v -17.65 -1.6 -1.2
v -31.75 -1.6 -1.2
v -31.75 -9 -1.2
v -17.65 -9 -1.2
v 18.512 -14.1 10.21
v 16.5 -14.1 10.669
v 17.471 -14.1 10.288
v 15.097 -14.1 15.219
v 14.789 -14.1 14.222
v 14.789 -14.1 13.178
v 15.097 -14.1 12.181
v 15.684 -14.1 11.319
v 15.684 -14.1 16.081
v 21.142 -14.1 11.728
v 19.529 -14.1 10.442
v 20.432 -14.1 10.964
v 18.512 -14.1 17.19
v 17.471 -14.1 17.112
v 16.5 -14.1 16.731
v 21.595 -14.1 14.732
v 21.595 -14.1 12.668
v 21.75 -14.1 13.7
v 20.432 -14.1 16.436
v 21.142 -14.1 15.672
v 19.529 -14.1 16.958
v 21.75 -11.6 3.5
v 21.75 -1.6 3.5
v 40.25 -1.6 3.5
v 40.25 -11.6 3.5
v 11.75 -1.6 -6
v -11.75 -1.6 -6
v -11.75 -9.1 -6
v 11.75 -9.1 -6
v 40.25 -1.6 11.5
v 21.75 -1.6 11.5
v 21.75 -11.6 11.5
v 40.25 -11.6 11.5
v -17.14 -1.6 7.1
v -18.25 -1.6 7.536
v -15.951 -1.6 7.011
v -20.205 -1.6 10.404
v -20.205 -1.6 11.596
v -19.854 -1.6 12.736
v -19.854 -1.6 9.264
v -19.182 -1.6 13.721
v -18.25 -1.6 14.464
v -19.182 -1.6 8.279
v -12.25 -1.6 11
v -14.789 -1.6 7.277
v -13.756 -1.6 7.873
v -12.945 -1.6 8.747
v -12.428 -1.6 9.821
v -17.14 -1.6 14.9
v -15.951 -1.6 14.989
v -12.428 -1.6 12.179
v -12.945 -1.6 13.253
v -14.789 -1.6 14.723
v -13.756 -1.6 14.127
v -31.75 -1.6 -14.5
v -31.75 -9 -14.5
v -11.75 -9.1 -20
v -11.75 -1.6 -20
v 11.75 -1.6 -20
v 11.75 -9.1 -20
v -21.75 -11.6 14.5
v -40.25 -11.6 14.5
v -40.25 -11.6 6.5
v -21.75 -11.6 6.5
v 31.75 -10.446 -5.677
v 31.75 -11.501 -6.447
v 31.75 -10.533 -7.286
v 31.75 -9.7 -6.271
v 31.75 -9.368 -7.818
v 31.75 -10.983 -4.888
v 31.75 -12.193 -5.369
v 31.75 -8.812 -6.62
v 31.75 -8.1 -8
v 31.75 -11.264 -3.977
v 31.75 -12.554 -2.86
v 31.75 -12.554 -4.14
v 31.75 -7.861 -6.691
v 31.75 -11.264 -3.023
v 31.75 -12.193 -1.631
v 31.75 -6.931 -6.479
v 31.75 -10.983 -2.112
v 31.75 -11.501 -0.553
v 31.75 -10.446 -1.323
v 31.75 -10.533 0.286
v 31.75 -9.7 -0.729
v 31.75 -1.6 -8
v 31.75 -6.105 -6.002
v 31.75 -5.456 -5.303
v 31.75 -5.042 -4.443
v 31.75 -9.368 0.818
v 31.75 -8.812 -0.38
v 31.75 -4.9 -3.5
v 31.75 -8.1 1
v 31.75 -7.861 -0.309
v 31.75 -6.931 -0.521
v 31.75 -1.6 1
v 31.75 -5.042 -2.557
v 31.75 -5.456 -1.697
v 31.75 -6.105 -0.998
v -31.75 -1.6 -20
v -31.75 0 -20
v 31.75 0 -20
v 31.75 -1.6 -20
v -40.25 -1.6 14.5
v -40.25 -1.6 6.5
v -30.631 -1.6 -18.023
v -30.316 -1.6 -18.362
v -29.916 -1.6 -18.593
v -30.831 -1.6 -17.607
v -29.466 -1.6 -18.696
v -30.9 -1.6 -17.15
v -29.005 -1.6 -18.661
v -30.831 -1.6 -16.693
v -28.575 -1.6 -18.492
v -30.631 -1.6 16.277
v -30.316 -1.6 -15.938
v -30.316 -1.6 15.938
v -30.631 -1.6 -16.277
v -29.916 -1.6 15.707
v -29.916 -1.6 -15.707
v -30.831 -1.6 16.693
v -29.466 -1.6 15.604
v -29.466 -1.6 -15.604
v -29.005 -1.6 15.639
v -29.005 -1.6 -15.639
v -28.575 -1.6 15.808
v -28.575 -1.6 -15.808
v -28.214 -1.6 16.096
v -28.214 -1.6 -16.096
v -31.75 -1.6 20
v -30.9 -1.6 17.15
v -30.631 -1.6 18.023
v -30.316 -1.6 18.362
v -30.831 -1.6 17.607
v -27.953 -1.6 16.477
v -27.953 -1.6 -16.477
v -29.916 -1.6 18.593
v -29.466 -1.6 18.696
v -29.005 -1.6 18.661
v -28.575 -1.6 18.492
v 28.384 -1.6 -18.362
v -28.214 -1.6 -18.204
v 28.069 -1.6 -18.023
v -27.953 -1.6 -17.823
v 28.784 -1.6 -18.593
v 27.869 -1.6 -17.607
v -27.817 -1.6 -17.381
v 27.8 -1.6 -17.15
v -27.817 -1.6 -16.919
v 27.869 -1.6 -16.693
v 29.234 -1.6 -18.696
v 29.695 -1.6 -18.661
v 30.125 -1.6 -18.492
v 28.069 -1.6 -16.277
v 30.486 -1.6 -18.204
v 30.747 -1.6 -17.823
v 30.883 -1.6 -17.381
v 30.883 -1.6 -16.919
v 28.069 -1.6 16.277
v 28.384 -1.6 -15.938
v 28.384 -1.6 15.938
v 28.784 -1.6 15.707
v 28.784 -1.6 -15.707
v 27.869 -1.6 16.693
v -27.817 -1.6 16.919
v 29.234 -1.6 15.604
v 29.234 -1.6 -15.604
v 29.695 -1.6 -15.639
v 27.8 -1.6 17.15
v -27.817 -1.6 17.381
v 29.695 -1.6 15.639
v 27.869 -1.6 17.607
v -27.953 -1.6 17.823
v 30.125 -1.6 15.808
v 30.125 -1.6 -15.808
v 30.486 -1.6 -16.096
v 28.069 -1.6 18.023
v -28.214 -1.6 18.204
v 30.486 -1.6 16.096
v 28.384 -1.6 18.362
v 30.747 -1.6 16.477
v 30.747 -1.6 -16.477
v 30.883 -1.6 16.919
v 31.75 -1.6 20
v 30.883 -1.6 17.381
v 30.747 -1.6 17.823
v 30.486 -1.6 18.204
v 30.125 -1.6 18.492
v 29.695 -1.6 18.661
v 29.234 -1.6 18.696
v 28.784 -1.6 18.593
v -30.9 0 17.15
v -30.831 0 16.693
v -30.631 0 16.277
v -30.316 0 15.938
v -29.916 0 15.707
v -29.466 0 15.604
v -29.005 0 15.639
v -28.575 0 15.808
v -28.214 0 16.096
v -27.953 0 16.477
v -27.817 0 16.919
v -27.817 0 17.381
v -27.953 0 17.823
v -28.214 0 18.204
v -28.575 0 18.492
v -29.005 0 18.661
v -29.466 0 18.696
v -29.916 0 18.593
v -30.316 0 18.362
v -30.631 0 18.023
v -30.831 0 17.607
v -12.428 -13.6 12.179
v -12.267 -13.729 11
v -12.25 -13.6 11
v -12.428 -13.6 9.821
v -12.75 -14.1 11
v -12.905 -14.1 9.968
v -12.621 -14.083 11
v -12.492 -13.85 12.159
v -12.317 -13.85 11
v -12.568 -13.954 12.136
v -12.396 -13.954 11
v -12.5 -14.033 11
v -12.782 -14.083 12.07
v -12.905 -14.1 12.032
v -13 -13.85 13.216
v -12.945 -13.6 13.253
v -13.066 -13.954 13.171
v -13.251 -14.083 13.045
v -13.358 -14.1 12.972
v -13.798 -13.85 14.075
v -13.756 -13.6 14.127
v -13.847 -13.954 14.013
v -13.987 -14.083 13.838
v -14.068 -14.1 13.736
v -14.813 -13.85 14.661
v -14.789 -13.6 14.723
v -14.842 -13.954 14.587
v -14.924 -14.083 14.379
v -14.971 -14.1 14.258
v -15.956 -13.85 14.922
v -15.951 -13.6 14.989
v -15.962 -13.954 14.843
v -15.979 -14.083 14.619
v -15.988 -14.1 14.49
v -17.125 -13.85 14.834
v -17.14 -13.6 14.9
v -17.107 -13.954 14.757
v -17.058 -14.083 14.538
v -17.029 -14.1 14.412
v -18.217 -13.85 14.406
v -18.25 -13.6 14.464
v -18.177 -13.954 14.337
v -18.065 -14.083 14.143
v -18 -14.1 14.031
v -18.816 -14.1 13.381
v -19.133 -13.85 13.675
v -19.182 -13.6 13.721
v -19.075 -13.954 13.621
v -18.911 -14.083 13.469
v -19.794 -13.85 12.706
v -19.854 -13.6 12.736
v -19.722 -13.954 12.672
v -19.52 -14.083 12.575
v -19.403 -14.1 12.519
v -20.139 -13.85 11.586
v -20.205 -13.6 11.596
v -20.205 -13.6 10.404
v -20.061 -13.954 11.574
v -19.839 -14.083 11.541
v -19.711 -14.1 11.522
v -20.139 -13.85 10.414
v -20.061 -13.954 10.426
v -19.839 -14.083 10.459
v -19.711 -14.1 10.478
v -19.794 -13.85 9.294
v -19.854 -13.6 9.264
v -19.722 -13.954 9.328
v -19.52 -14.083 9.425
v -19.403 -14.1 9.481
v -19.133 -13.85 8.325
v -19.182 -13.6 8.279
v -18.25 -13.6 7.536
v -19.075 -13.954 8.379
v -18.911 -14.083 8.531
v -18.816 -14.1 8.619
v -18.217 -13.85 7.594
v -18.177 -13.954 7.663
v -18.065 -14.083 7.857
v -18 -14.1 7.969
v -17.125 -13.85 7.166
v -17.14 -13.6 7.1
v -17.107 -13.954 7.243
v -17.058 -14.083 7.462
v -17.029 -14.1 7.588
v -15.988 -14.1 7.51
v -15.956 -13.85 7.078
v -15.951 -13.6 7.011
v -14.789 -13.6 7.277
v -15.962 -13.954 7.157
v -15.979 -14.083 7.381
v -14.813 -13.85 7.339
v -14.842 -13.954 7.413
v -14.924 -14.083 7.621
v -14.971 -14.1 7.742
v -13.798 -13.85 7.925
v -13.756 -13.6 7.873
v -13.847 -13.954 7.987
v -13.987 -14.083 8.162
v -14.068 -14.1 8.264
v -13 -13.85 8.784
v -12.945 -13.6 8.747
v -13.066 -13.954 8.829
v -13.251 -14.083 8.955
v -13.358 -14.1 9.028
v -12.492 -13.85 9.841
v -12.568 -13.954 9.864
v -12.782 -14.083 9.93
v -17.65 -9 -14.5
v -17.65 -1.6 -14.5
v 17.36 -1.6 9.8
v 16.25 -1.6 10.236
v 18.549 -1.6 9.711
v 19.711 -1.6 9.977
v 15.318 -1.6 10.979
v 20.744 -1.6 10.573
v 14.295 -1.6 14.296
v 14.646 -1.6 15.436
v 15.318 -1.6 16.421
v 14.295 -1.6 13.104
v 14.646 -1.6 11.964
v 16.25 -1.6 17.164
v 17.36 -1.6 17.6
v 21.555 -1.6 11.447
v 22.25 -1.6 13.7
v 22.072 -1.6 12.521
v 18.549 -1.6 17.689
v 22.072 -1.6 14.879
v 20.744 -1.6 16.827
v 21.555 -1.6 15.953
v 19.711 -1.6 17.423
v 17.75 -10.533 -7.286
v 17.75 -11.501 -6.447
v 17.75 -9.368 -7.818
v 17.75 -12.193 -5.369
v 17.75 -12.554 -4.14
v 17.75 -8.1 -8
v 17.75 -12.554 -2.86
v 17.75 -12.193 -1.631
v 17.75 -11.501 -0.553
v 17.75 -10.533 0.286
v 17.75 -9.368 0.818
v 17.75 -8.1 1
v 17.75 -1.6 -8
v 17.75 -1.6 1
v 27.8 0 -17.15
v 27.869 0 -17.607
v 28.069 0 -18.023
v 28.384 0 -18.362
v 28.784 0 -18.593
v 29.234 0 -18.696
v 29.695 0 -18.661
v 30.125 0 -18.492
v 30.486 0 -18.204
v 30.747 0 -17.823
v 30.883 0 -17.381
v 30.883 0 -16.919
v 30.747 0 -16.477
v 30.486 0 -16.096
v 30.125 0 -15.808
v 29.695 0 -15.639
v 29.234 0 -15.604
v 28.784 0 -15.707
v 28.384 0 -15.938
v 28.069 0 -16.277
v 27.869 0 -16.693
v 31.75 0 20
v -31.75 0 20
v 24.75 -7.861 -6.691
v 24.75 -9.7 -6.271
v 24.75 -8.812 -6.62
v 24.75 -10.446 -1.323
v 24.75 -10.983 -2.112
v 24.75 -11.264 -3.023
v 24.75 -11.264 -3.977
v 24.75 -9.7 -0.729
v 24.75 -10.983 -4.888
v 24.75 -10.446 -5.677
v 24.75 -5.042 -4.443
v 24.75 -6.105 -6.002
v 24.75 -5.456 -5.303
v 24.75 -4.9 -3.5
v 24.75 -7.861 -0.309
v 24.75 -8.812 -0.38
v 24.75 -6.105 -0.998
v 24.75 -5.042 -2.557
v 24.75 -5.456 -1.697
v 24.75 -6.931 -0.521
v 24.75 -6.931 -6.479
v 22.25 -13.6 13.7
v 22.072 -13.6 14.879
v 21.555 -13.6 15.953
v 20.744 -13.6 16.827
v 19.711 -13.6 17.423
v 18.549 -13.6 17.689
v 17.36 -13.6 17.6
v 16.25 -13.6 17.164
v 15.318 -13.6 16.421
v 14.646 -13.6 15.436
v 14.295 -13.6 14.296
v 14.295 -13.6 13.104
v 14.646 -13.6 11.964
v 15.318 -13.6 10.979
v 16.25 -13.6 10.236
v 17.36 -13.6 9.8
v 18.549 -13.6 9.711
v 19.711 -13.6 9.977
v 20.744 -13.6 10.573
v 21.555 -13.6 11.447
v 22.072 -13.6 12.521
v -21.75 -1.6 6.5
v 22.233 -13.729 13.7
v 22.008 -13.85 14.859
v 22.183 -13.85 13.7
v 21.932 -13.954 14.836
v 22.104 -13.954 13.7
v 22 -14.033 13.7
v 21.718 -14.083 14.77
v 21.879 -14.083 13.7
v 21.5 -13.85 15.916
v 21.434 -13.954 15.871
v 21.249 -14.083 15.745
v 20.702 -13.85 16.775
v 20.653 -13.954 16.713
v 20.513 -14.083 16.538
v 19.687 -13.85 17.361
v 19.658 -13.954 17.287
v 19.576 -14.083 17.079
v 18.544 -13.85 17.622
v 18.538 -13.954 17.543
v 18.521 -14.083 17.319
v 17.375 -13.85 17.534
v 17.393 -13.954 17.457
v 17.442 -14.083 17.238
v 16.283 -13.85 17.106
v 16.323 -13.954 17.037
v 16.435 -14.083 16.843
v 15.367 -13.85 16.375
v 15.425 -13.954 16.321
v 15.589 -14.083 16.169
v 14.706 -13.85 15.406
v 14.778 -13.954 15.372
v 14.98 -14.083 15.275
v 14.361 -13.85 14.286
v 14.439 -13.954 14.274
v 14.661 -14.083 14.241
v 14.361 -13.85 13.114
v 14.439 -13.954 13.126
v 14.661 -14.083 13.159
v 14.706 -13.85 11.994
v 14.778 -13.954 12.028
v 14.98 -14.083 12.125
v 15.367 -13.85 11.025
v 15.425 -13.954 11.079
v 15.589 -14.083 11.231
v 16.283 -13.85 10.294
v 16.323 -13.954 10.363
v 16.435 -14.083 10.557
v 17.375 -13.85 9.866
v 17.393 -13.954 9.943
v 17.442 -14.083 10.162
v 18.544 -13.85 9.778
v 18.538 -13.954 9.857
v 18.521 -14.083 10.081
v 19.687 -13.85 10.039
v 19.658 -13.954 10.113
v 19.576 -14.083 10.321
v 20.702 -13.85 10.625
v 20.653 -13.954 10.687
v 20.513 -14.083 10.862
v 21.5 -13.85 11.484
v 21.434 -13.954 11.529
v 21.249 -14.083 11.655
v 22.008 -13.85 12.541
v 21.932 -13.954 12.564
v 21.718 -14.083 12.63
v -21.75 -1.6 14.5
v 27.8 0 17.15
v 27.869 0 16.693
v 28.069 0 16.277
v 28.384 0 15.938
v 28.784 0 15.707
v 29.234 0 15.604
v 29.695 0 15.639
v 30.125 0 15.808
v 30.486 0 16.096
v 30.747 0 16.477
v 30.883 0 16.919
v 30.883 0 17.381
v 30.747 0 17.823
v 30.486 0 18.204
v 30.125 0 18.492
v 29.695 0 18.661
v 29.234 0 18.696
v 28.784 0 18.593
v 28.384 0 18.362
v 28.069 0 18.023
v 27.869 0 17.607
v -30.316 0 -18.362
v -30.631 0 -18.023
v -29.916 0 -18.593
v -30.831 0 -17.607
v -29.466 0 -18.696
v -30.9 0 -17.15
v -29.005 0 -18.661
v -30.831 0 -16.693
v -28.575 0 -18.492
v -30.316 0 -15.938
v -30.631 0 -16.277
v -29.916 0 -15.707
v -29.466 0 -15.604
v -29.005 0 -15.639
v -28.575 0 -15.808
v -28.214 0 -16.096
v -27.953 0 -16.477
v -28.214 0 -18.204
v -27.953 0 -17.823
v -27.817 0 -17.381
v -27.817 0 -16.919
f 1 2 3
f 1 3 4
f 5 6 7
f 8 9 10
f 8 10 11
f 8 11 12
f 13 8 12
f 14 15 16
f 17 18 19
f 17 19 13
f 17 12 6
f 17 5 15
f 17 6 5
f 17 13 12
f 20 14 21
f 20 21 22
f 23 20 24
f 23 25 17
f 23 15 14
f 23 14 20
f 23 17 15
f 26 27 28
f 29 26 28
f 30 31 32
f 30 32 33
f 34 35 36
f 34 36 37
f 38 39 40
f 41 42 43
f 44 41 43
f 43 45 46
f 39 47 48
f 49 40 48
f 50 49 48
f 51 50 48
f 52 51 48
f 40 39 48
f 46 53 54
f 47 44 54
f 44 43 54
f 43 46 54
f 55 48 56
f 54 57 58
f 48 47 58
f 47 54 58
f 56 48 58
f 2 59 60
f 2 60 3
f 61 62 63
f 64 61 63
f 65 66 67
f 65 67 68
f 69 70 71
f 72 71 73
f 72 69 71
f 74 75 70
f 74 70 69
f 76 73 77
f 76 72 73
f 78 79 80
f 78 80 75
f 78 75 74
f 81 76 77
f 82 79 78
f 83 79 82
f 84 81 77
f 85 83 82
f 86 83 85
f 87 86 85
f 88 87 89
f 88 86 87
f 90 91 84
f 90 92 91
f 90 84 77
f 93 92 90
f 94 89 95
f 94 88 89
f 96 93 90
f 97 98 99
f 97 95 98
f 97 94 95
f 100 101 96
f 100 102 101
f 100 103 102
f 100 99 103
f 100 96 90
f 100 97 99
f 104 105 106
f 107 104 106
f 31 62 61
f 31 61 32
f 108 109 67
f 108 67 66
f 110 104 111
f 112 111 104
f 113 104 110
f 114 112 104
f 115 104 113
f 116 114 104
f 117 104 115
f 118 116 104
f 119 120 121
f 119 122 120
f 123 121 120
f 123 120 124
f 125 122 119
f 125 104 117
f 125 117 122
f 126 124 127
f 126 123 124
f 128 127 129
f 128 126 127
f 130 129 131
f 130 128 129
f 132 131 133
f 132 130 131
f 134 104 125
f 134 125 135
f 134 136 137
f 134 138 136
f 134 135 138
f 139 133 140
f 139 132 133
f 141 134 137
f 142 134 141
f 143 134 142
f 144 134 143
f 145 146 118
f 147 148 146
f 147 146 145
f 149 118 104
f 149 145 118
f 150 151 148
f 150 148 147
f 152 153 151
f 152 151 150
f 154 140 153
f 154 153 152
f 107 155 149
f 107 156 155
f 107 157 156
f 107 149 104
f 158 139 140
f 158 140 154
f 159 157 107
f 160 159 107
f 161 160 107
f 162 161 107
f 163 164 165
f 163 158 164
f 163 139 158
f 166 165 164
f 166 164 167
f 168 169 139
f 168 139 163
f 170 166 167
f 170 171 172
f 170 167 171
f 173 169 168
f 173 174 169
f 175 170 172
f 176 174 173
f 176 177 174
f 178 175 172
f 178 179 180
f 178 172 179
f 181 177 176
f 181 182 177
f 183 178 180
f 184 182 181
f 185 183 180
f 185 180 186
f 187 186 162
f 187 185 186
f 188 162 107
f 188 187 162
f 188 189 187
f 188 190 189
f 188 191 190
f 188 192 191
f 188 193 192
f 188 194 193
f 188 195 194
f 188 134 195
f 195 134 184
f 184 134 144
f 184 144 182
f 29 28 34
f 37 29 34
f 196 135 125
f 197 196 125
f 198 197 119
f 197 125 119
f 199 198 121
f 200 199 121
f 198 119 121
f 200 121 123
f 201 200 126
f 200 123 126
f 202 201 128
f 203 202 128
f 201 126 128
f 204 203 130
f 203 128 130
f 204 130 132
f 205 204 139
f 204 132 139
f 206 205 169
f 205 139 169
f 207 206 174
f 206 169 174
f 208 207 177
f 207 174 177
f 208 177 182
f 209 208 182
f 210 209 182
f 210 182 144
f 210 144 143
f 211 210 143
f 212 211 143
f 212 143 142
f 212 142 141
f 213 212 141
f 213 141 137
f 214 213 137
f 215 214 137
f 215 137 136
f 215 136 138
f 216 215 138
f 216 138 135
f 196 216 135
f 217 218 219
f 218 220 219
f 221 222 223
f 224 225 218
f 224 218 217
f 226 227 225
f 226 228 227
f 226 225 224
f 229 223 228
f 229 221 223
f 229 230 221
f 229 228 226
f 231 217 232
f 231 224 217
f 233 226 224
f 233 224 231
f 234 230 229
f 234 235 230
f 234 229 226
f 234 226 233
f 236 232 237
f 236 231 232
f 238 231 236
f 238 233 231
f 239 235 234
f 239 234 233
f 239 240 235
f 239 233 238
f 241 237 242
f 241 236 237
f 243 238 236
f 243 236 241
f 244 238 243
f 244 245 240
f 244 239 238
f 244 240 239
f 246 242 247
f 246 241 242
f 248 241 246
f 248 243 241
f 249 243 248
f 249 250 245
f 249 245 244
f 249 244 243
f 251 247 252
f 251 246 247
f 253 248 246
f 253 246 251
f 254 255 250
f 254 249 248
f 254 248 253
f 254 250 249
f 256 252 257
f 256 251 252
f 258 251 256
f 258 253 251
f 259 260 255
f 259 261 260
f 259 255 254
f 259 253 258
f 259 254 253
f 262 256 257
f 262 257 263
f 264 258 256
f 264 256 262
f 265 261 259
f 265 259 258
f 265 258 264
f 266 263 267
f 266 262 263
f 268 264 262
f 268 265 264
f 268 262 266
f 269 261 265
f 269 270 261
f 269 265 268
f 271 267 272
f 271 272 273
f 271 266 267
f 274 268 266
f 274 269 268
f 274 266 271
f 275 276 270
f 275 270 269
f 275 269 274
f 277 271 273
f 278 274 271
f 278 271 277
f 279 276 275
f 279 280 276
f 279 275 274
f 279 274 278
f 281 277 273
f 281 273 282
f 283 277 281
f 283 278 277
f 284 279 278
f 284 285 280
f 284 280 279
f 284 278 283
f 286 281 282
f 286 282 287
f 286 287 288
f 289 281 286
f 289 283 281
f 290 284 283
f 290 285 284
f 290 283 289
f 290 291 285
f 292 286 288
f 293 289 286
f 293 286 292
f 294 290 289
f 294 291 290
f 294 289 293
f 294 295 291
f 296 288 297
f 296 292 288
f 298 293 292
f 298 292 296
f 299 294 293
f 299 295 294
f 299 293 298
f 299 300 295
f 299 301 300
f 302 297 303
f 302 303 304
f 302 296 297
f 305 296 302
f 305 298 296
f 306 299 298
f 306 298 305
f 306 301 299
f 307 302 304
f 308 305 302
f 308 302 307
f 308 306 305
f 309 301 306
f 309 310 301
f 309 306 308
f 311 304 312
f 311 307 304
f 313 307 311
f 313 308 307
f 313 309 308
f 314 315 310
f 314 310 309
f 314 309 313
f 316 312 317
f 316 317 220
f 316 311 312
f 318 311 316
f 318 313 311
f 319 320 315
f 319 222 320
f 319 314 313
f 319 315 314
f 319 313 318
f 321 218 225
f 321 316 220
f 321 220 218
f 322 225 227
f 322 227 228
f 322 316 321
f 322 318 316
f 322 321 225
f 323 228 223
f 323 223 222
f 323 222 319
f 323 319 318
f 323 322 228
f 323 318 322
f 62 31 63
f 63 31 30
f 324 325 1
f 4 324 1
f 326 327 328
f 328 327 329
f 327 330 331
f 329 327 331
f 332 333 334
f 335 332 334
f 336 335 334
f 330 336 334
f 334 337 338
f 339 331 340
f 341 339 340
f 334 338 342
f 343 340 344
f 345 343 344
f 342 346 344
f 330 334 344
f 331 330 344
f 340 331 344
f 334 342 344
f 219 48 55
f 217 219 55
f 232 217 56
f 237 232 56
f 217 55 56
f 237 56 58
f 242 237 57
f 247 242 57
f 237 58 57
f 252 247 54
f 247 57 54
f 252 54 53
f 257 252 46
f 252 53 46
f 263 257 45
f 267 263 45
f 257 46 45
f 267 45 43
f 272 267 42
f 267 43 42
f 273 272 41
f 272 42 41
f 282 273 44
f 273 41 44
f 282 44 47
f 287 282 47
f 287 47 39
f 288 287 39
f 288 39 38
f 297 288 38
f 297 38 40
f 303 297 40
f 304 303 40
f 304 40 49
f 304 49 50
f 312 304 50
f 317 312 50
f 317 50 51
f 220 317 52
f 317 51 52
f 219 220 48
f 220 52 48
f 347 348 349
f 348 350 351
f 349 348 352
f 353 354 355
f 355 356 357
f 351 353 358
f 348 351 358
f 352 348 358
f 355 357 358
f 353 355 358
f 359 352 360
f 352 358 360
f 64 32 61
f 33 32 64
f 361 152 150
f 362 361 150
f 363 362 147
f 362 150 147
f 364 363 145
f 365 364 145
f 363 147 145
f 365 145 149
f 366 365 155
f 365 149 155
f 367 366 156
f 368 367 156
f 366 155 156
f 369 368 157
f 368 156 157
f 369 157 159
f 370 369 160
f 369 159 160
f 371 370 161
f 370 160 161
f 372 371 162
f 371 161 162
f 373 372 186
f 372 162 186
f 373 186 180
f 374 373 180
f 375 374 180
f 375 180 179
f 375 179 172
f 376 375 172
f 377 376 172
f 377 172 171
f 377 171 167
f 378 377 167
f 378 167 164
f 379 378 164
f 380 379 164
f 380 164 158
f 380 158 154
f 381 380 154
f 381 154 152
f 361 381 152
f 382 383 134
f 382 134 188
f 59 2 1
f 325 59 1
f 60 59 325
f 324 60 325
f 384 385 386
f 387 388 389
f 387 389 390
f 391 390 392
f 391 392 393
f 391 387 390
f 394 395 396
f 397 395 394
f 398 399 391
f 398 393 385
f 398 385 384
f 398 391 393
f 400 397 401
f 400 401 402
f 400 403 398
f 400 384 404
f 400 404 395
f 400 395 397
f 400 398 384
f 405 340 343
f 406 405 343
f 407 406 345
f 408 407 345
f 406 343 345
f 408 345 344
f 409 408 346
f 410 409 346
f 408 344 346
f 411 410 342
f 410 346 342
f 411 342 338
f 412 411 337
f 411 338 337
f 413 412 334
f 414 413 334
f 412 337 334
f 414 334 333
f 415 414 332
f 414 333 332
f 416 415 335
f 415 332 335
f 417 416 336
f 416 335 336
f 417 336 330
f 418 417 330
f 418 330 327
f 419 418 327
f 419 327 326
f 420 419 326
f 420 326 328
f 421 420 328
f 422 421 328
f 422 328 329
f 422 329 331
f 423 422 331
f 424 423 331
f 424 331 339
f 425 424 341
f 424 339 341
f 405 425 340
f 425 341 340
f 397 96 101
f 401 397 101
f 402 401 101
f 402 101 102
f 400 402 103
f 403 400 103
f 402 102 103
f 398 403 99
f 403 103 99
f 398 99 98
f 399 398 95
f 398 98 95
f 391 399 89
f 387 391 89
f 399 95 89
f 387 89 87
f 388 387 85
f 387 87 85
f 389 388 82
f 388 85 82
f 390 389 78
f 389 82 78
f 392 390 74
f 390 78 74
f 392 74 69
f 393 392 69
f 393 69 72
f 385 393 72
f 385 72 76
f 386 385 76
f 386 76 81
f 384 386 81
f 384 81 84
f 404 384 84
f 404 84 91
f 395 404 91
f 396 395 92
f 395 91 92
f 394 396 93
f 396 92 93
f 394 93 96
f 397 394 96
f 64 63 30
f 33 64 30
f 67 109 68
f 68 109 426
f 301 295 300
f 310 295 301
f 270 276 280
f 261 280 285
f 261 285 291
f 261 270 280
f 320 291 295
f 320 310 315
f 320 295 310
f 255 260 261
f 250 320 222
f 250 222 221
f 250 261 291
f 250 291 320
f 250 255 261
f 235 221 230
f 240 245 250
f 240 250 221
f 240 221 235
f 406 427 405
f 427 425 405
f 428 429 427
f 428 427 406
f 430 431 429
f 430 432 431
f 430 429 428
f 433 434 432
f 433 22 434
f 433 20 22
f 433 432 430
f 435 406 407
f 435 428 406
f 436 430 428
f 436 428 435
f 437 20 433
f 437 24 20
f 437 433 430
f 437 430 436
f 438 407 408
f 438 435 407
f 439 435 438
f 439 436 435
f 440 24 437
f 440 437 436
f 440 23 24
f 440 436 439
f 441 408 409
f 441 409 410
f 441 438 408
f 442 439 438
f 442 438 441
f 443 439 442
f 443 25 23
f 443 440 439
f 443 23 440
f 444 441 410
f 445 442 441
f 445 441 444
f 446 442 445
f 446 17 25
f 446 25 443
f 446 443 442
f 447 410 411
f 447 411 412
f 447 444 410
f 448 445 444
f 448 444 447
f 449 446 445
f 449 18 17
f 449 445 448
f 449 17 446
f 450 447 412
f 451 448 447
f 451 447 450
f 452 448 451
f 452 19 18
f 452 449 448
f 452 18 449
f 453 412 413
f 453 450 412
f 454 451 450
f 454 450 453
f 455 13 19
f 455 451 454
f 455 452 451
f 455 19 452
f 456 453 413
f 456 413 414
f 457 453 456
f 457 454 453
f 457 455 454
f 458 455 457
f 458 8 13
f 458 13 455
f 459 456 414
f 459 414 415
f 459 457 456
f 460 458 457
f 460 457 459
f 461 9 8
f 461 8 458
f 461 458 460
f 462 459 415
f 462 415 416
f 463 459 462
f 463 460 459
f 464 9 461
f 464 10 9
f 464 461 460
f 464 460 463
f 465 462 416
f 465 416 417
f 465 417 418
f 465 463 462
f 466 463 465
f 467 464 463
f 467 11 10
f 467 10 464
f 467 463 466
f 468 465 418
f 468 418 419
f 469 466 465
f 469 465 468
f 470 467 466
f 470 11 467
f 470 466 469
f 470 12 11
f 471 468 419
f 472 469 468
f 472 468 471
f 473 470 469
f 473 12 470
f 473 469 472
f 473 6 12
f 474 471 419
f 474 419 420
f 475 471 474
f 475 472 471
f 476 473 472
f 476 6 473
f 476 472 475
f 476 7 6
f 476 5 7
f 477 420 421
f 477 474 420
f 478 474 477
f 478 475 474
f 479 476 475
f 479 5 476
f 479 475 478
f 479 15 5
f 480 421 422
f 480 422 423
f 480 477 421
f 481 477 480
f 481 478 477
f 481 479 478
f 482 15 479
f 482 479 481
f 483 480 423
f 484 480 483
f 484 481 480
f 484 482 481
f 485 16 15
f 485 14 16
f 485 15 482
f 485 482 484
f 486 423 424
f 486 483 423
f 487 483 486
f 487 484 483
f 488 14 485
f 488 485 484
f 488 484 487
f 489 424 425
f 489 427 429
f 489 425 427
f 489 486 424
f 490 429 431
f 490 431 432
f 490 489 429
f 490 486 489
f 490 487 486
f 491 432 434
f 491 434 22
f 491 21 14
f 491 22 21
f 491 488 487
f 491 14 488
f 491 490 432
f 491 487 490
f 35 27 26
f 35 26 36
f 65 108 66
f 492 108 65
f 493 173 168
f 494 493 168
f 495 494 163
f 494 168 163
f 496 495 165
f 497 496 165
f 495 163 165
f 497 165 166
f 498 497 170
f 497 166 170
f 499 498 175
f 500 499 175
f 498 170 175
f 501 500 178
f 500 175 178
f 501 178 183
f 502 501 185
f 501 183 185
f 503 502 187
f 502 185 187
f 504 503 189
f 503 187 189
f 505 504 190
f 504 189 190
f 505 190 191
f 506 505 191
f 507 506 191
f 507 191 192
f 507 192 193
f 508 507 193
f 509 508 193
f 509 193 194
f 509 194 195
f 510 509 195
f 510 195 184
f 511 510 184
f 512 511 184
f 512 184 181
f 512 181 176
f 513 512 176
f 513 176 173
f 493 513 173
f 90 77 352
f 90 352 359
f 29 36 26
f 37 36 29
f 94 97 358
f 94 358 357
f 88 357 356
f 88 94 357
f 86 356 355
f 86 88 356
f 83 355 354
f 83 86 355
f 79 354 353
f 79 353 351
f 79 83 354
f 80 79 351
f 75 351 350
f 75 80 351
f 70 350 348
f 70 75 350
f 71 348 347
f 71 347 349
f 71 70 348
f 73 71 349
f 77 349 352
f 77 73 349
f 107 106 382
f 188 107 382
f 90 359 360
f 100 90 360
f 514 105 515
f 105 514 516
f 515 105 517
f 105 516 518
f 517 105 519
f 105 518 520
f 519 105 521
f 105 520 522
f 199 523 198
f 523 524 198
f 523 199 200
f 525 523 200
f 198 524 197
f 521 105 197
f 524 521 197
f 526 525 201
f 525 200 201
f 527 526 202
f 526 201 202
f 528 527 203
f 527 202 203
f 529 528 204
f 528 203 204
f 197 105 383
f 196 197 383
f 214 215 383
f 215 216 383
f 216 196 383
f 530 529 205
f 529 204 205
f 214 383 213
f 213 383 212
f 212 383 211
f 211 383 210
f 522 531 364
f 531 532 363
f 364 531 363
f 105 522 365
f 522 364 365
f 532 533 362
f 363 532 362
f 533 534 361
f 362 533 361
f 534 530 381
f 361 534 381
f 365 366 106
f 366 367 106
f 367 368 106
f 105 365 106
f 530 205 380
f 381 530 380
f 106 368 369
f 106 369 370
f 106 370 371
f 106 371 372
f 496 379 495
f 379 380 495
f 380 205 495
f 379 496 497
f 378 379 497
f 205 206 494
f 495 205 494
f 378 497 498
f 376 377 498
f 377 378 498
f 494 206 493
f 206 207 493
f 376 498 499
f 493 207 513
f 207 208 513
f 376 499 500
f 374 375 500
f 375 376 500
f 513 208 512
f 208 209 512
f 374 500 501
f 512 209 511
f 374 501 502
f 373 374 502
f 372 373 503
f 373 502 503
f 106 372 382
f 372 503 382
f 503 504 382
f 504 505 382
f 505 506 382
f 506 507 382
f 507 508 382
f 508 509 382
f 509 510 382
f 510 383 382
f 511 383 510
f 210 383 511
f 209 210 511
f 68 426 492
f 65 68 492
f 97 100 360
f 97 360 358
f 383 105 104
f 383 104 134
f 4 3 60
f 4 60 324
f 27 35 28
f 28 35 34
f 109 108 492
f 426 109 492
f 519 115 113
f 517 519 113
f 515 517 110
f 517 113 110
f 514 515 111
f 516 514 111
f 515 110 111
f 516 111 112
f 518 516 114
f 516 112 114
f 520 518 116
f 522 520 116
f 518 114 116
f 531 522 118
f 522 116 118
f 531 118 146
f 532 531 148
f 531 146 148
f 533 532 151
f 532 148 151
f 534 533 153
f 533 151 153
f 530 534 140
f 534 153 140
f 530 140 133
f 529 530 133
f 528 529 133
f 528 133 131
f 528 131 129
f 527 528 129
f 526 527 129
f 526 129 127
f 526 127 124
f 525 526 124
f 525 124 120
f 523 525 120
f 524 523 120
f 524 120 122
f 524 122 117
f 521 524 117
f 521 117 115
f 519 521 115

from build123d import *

# Parameters (mm, degrees)
F0_W      = 63.5
F0_H      = 40
F1_DEPTH  = 1.6
F2_D      = 3.1
F3_W      = 23.5
F3_H      = 14
F4_DEPTH  = 7.5
F5_W      = 14.1
F5_H      = 13.3
F6_DEPTH  = 7.4
F7_W      = 18.5
F7_H      = 8
F8_DEPTH  = 10
F9_R      = 4
F10_DEPTH = 12.5
F11_R     = 0.5
F12_R     = 3.2
F13_DEPTH = 14
F14_DEPTH = 7


with BuildPart() as f1:
    # F0 (on Front) → F1 (new body)
    with BuildSketch(Plane.XZ):
        Rectangle(F0_W, F0_H)
    extrude(amount=F1_DEPTH)

    # F2 (through all)
    with Locations(Plane(origin=(0, 0, 0), x_dir=(1, 0, 0), z_dir=(0, 1, 0))):
        with Locations((-29.35, 17.15), (29.35, 17.15), (29.35, -17.15), (-29.35, -17.15)):
            Hole(F2_D / 2)


with BuildPart() as f4:
    # F3 (on face) → F4 (new body)
    with BuildSketch(Plane.XZ.offset(1.6)):
        with Locations((0, -13)):
            Rectangle(F3_W, F3_H)
    extrude(amount=F4_DEPTH)


with BuildPart() as f6:
    # F5 (on face) → F6 (new body)
    with BuildSketch(Plane.XZ.offset(1.6)):
        with Locations((-24.7, -7.85)):
            Rectangle(F5_W, F5_H)
    extrude(amount=F6_DEPTH)


with BuildPart() as f8:
    # F7 (on face) → F8 (new body)
    with BuildSketch(Plane.XZ.offset(1.6)):
        with Locations((-31, 10.5)):
            Rectangle(F7_W, F7_H)
        with Locations((31, 7.5)):
            Rectangle(F7_W, F7_H)
    extrude(amount=F8_DEPTH)


with BuildPart() as f10:
    # F9 (on face) → F10 (new body)
    with BuildSketch(Plane.XZ.offset(1.6)):
        with Locations((-16.25, 11)):
            Circle(F9_R)
        with Locations((18.25, 13.7)):
            Circle(F9_R)
    extrude(amount=F10_DEPTH)

    # F11
    f11_edges = [f10.edges().sort_by_distance(p)[0] for p in [
        (-20.25, -14.1, 11),
        (14.25, -14.1, 13.7),
    ]]
    fillet(f11_edges, radius=F11_R)


with BuildPart() as f13:
    # F12 (on face) → F13 (new body)
    with BuildSketch(Plane.YZ.offset(31.75)):
        with BuildLine():
            Line((-8.1, -8), (-1.6, -8))
            Line((-1.6, -8), (-1.6, 1))
            Line((-1.6, 1), (-8.1, 1))
            ThreePointArc((-8.1, 1), (-12.6, -3.5), (-8.1, -8))
        make_face()
        with Locations((-8.1, -3.5)):
            Circle(F12_R, mode=Mode.SUBTRACT)
        with Locations((-8.1, -3.5)):
            Circle(F12_R)
    extrude(amount=-F13_DEPTH)

    # F12 (on face) → F14 (cut)
    with BuildSketch(Plane.YZ.offset(31.75)):
        with Locations((-8.1, -3.5)):
            Circle(F12_R)
    extrude(amount=-F14_DEPTH, mode=Mode.SUBTRACT)


solid = Compound([f1.part, f4.part, f6.part, f8.part, f10.part, f13.part])
